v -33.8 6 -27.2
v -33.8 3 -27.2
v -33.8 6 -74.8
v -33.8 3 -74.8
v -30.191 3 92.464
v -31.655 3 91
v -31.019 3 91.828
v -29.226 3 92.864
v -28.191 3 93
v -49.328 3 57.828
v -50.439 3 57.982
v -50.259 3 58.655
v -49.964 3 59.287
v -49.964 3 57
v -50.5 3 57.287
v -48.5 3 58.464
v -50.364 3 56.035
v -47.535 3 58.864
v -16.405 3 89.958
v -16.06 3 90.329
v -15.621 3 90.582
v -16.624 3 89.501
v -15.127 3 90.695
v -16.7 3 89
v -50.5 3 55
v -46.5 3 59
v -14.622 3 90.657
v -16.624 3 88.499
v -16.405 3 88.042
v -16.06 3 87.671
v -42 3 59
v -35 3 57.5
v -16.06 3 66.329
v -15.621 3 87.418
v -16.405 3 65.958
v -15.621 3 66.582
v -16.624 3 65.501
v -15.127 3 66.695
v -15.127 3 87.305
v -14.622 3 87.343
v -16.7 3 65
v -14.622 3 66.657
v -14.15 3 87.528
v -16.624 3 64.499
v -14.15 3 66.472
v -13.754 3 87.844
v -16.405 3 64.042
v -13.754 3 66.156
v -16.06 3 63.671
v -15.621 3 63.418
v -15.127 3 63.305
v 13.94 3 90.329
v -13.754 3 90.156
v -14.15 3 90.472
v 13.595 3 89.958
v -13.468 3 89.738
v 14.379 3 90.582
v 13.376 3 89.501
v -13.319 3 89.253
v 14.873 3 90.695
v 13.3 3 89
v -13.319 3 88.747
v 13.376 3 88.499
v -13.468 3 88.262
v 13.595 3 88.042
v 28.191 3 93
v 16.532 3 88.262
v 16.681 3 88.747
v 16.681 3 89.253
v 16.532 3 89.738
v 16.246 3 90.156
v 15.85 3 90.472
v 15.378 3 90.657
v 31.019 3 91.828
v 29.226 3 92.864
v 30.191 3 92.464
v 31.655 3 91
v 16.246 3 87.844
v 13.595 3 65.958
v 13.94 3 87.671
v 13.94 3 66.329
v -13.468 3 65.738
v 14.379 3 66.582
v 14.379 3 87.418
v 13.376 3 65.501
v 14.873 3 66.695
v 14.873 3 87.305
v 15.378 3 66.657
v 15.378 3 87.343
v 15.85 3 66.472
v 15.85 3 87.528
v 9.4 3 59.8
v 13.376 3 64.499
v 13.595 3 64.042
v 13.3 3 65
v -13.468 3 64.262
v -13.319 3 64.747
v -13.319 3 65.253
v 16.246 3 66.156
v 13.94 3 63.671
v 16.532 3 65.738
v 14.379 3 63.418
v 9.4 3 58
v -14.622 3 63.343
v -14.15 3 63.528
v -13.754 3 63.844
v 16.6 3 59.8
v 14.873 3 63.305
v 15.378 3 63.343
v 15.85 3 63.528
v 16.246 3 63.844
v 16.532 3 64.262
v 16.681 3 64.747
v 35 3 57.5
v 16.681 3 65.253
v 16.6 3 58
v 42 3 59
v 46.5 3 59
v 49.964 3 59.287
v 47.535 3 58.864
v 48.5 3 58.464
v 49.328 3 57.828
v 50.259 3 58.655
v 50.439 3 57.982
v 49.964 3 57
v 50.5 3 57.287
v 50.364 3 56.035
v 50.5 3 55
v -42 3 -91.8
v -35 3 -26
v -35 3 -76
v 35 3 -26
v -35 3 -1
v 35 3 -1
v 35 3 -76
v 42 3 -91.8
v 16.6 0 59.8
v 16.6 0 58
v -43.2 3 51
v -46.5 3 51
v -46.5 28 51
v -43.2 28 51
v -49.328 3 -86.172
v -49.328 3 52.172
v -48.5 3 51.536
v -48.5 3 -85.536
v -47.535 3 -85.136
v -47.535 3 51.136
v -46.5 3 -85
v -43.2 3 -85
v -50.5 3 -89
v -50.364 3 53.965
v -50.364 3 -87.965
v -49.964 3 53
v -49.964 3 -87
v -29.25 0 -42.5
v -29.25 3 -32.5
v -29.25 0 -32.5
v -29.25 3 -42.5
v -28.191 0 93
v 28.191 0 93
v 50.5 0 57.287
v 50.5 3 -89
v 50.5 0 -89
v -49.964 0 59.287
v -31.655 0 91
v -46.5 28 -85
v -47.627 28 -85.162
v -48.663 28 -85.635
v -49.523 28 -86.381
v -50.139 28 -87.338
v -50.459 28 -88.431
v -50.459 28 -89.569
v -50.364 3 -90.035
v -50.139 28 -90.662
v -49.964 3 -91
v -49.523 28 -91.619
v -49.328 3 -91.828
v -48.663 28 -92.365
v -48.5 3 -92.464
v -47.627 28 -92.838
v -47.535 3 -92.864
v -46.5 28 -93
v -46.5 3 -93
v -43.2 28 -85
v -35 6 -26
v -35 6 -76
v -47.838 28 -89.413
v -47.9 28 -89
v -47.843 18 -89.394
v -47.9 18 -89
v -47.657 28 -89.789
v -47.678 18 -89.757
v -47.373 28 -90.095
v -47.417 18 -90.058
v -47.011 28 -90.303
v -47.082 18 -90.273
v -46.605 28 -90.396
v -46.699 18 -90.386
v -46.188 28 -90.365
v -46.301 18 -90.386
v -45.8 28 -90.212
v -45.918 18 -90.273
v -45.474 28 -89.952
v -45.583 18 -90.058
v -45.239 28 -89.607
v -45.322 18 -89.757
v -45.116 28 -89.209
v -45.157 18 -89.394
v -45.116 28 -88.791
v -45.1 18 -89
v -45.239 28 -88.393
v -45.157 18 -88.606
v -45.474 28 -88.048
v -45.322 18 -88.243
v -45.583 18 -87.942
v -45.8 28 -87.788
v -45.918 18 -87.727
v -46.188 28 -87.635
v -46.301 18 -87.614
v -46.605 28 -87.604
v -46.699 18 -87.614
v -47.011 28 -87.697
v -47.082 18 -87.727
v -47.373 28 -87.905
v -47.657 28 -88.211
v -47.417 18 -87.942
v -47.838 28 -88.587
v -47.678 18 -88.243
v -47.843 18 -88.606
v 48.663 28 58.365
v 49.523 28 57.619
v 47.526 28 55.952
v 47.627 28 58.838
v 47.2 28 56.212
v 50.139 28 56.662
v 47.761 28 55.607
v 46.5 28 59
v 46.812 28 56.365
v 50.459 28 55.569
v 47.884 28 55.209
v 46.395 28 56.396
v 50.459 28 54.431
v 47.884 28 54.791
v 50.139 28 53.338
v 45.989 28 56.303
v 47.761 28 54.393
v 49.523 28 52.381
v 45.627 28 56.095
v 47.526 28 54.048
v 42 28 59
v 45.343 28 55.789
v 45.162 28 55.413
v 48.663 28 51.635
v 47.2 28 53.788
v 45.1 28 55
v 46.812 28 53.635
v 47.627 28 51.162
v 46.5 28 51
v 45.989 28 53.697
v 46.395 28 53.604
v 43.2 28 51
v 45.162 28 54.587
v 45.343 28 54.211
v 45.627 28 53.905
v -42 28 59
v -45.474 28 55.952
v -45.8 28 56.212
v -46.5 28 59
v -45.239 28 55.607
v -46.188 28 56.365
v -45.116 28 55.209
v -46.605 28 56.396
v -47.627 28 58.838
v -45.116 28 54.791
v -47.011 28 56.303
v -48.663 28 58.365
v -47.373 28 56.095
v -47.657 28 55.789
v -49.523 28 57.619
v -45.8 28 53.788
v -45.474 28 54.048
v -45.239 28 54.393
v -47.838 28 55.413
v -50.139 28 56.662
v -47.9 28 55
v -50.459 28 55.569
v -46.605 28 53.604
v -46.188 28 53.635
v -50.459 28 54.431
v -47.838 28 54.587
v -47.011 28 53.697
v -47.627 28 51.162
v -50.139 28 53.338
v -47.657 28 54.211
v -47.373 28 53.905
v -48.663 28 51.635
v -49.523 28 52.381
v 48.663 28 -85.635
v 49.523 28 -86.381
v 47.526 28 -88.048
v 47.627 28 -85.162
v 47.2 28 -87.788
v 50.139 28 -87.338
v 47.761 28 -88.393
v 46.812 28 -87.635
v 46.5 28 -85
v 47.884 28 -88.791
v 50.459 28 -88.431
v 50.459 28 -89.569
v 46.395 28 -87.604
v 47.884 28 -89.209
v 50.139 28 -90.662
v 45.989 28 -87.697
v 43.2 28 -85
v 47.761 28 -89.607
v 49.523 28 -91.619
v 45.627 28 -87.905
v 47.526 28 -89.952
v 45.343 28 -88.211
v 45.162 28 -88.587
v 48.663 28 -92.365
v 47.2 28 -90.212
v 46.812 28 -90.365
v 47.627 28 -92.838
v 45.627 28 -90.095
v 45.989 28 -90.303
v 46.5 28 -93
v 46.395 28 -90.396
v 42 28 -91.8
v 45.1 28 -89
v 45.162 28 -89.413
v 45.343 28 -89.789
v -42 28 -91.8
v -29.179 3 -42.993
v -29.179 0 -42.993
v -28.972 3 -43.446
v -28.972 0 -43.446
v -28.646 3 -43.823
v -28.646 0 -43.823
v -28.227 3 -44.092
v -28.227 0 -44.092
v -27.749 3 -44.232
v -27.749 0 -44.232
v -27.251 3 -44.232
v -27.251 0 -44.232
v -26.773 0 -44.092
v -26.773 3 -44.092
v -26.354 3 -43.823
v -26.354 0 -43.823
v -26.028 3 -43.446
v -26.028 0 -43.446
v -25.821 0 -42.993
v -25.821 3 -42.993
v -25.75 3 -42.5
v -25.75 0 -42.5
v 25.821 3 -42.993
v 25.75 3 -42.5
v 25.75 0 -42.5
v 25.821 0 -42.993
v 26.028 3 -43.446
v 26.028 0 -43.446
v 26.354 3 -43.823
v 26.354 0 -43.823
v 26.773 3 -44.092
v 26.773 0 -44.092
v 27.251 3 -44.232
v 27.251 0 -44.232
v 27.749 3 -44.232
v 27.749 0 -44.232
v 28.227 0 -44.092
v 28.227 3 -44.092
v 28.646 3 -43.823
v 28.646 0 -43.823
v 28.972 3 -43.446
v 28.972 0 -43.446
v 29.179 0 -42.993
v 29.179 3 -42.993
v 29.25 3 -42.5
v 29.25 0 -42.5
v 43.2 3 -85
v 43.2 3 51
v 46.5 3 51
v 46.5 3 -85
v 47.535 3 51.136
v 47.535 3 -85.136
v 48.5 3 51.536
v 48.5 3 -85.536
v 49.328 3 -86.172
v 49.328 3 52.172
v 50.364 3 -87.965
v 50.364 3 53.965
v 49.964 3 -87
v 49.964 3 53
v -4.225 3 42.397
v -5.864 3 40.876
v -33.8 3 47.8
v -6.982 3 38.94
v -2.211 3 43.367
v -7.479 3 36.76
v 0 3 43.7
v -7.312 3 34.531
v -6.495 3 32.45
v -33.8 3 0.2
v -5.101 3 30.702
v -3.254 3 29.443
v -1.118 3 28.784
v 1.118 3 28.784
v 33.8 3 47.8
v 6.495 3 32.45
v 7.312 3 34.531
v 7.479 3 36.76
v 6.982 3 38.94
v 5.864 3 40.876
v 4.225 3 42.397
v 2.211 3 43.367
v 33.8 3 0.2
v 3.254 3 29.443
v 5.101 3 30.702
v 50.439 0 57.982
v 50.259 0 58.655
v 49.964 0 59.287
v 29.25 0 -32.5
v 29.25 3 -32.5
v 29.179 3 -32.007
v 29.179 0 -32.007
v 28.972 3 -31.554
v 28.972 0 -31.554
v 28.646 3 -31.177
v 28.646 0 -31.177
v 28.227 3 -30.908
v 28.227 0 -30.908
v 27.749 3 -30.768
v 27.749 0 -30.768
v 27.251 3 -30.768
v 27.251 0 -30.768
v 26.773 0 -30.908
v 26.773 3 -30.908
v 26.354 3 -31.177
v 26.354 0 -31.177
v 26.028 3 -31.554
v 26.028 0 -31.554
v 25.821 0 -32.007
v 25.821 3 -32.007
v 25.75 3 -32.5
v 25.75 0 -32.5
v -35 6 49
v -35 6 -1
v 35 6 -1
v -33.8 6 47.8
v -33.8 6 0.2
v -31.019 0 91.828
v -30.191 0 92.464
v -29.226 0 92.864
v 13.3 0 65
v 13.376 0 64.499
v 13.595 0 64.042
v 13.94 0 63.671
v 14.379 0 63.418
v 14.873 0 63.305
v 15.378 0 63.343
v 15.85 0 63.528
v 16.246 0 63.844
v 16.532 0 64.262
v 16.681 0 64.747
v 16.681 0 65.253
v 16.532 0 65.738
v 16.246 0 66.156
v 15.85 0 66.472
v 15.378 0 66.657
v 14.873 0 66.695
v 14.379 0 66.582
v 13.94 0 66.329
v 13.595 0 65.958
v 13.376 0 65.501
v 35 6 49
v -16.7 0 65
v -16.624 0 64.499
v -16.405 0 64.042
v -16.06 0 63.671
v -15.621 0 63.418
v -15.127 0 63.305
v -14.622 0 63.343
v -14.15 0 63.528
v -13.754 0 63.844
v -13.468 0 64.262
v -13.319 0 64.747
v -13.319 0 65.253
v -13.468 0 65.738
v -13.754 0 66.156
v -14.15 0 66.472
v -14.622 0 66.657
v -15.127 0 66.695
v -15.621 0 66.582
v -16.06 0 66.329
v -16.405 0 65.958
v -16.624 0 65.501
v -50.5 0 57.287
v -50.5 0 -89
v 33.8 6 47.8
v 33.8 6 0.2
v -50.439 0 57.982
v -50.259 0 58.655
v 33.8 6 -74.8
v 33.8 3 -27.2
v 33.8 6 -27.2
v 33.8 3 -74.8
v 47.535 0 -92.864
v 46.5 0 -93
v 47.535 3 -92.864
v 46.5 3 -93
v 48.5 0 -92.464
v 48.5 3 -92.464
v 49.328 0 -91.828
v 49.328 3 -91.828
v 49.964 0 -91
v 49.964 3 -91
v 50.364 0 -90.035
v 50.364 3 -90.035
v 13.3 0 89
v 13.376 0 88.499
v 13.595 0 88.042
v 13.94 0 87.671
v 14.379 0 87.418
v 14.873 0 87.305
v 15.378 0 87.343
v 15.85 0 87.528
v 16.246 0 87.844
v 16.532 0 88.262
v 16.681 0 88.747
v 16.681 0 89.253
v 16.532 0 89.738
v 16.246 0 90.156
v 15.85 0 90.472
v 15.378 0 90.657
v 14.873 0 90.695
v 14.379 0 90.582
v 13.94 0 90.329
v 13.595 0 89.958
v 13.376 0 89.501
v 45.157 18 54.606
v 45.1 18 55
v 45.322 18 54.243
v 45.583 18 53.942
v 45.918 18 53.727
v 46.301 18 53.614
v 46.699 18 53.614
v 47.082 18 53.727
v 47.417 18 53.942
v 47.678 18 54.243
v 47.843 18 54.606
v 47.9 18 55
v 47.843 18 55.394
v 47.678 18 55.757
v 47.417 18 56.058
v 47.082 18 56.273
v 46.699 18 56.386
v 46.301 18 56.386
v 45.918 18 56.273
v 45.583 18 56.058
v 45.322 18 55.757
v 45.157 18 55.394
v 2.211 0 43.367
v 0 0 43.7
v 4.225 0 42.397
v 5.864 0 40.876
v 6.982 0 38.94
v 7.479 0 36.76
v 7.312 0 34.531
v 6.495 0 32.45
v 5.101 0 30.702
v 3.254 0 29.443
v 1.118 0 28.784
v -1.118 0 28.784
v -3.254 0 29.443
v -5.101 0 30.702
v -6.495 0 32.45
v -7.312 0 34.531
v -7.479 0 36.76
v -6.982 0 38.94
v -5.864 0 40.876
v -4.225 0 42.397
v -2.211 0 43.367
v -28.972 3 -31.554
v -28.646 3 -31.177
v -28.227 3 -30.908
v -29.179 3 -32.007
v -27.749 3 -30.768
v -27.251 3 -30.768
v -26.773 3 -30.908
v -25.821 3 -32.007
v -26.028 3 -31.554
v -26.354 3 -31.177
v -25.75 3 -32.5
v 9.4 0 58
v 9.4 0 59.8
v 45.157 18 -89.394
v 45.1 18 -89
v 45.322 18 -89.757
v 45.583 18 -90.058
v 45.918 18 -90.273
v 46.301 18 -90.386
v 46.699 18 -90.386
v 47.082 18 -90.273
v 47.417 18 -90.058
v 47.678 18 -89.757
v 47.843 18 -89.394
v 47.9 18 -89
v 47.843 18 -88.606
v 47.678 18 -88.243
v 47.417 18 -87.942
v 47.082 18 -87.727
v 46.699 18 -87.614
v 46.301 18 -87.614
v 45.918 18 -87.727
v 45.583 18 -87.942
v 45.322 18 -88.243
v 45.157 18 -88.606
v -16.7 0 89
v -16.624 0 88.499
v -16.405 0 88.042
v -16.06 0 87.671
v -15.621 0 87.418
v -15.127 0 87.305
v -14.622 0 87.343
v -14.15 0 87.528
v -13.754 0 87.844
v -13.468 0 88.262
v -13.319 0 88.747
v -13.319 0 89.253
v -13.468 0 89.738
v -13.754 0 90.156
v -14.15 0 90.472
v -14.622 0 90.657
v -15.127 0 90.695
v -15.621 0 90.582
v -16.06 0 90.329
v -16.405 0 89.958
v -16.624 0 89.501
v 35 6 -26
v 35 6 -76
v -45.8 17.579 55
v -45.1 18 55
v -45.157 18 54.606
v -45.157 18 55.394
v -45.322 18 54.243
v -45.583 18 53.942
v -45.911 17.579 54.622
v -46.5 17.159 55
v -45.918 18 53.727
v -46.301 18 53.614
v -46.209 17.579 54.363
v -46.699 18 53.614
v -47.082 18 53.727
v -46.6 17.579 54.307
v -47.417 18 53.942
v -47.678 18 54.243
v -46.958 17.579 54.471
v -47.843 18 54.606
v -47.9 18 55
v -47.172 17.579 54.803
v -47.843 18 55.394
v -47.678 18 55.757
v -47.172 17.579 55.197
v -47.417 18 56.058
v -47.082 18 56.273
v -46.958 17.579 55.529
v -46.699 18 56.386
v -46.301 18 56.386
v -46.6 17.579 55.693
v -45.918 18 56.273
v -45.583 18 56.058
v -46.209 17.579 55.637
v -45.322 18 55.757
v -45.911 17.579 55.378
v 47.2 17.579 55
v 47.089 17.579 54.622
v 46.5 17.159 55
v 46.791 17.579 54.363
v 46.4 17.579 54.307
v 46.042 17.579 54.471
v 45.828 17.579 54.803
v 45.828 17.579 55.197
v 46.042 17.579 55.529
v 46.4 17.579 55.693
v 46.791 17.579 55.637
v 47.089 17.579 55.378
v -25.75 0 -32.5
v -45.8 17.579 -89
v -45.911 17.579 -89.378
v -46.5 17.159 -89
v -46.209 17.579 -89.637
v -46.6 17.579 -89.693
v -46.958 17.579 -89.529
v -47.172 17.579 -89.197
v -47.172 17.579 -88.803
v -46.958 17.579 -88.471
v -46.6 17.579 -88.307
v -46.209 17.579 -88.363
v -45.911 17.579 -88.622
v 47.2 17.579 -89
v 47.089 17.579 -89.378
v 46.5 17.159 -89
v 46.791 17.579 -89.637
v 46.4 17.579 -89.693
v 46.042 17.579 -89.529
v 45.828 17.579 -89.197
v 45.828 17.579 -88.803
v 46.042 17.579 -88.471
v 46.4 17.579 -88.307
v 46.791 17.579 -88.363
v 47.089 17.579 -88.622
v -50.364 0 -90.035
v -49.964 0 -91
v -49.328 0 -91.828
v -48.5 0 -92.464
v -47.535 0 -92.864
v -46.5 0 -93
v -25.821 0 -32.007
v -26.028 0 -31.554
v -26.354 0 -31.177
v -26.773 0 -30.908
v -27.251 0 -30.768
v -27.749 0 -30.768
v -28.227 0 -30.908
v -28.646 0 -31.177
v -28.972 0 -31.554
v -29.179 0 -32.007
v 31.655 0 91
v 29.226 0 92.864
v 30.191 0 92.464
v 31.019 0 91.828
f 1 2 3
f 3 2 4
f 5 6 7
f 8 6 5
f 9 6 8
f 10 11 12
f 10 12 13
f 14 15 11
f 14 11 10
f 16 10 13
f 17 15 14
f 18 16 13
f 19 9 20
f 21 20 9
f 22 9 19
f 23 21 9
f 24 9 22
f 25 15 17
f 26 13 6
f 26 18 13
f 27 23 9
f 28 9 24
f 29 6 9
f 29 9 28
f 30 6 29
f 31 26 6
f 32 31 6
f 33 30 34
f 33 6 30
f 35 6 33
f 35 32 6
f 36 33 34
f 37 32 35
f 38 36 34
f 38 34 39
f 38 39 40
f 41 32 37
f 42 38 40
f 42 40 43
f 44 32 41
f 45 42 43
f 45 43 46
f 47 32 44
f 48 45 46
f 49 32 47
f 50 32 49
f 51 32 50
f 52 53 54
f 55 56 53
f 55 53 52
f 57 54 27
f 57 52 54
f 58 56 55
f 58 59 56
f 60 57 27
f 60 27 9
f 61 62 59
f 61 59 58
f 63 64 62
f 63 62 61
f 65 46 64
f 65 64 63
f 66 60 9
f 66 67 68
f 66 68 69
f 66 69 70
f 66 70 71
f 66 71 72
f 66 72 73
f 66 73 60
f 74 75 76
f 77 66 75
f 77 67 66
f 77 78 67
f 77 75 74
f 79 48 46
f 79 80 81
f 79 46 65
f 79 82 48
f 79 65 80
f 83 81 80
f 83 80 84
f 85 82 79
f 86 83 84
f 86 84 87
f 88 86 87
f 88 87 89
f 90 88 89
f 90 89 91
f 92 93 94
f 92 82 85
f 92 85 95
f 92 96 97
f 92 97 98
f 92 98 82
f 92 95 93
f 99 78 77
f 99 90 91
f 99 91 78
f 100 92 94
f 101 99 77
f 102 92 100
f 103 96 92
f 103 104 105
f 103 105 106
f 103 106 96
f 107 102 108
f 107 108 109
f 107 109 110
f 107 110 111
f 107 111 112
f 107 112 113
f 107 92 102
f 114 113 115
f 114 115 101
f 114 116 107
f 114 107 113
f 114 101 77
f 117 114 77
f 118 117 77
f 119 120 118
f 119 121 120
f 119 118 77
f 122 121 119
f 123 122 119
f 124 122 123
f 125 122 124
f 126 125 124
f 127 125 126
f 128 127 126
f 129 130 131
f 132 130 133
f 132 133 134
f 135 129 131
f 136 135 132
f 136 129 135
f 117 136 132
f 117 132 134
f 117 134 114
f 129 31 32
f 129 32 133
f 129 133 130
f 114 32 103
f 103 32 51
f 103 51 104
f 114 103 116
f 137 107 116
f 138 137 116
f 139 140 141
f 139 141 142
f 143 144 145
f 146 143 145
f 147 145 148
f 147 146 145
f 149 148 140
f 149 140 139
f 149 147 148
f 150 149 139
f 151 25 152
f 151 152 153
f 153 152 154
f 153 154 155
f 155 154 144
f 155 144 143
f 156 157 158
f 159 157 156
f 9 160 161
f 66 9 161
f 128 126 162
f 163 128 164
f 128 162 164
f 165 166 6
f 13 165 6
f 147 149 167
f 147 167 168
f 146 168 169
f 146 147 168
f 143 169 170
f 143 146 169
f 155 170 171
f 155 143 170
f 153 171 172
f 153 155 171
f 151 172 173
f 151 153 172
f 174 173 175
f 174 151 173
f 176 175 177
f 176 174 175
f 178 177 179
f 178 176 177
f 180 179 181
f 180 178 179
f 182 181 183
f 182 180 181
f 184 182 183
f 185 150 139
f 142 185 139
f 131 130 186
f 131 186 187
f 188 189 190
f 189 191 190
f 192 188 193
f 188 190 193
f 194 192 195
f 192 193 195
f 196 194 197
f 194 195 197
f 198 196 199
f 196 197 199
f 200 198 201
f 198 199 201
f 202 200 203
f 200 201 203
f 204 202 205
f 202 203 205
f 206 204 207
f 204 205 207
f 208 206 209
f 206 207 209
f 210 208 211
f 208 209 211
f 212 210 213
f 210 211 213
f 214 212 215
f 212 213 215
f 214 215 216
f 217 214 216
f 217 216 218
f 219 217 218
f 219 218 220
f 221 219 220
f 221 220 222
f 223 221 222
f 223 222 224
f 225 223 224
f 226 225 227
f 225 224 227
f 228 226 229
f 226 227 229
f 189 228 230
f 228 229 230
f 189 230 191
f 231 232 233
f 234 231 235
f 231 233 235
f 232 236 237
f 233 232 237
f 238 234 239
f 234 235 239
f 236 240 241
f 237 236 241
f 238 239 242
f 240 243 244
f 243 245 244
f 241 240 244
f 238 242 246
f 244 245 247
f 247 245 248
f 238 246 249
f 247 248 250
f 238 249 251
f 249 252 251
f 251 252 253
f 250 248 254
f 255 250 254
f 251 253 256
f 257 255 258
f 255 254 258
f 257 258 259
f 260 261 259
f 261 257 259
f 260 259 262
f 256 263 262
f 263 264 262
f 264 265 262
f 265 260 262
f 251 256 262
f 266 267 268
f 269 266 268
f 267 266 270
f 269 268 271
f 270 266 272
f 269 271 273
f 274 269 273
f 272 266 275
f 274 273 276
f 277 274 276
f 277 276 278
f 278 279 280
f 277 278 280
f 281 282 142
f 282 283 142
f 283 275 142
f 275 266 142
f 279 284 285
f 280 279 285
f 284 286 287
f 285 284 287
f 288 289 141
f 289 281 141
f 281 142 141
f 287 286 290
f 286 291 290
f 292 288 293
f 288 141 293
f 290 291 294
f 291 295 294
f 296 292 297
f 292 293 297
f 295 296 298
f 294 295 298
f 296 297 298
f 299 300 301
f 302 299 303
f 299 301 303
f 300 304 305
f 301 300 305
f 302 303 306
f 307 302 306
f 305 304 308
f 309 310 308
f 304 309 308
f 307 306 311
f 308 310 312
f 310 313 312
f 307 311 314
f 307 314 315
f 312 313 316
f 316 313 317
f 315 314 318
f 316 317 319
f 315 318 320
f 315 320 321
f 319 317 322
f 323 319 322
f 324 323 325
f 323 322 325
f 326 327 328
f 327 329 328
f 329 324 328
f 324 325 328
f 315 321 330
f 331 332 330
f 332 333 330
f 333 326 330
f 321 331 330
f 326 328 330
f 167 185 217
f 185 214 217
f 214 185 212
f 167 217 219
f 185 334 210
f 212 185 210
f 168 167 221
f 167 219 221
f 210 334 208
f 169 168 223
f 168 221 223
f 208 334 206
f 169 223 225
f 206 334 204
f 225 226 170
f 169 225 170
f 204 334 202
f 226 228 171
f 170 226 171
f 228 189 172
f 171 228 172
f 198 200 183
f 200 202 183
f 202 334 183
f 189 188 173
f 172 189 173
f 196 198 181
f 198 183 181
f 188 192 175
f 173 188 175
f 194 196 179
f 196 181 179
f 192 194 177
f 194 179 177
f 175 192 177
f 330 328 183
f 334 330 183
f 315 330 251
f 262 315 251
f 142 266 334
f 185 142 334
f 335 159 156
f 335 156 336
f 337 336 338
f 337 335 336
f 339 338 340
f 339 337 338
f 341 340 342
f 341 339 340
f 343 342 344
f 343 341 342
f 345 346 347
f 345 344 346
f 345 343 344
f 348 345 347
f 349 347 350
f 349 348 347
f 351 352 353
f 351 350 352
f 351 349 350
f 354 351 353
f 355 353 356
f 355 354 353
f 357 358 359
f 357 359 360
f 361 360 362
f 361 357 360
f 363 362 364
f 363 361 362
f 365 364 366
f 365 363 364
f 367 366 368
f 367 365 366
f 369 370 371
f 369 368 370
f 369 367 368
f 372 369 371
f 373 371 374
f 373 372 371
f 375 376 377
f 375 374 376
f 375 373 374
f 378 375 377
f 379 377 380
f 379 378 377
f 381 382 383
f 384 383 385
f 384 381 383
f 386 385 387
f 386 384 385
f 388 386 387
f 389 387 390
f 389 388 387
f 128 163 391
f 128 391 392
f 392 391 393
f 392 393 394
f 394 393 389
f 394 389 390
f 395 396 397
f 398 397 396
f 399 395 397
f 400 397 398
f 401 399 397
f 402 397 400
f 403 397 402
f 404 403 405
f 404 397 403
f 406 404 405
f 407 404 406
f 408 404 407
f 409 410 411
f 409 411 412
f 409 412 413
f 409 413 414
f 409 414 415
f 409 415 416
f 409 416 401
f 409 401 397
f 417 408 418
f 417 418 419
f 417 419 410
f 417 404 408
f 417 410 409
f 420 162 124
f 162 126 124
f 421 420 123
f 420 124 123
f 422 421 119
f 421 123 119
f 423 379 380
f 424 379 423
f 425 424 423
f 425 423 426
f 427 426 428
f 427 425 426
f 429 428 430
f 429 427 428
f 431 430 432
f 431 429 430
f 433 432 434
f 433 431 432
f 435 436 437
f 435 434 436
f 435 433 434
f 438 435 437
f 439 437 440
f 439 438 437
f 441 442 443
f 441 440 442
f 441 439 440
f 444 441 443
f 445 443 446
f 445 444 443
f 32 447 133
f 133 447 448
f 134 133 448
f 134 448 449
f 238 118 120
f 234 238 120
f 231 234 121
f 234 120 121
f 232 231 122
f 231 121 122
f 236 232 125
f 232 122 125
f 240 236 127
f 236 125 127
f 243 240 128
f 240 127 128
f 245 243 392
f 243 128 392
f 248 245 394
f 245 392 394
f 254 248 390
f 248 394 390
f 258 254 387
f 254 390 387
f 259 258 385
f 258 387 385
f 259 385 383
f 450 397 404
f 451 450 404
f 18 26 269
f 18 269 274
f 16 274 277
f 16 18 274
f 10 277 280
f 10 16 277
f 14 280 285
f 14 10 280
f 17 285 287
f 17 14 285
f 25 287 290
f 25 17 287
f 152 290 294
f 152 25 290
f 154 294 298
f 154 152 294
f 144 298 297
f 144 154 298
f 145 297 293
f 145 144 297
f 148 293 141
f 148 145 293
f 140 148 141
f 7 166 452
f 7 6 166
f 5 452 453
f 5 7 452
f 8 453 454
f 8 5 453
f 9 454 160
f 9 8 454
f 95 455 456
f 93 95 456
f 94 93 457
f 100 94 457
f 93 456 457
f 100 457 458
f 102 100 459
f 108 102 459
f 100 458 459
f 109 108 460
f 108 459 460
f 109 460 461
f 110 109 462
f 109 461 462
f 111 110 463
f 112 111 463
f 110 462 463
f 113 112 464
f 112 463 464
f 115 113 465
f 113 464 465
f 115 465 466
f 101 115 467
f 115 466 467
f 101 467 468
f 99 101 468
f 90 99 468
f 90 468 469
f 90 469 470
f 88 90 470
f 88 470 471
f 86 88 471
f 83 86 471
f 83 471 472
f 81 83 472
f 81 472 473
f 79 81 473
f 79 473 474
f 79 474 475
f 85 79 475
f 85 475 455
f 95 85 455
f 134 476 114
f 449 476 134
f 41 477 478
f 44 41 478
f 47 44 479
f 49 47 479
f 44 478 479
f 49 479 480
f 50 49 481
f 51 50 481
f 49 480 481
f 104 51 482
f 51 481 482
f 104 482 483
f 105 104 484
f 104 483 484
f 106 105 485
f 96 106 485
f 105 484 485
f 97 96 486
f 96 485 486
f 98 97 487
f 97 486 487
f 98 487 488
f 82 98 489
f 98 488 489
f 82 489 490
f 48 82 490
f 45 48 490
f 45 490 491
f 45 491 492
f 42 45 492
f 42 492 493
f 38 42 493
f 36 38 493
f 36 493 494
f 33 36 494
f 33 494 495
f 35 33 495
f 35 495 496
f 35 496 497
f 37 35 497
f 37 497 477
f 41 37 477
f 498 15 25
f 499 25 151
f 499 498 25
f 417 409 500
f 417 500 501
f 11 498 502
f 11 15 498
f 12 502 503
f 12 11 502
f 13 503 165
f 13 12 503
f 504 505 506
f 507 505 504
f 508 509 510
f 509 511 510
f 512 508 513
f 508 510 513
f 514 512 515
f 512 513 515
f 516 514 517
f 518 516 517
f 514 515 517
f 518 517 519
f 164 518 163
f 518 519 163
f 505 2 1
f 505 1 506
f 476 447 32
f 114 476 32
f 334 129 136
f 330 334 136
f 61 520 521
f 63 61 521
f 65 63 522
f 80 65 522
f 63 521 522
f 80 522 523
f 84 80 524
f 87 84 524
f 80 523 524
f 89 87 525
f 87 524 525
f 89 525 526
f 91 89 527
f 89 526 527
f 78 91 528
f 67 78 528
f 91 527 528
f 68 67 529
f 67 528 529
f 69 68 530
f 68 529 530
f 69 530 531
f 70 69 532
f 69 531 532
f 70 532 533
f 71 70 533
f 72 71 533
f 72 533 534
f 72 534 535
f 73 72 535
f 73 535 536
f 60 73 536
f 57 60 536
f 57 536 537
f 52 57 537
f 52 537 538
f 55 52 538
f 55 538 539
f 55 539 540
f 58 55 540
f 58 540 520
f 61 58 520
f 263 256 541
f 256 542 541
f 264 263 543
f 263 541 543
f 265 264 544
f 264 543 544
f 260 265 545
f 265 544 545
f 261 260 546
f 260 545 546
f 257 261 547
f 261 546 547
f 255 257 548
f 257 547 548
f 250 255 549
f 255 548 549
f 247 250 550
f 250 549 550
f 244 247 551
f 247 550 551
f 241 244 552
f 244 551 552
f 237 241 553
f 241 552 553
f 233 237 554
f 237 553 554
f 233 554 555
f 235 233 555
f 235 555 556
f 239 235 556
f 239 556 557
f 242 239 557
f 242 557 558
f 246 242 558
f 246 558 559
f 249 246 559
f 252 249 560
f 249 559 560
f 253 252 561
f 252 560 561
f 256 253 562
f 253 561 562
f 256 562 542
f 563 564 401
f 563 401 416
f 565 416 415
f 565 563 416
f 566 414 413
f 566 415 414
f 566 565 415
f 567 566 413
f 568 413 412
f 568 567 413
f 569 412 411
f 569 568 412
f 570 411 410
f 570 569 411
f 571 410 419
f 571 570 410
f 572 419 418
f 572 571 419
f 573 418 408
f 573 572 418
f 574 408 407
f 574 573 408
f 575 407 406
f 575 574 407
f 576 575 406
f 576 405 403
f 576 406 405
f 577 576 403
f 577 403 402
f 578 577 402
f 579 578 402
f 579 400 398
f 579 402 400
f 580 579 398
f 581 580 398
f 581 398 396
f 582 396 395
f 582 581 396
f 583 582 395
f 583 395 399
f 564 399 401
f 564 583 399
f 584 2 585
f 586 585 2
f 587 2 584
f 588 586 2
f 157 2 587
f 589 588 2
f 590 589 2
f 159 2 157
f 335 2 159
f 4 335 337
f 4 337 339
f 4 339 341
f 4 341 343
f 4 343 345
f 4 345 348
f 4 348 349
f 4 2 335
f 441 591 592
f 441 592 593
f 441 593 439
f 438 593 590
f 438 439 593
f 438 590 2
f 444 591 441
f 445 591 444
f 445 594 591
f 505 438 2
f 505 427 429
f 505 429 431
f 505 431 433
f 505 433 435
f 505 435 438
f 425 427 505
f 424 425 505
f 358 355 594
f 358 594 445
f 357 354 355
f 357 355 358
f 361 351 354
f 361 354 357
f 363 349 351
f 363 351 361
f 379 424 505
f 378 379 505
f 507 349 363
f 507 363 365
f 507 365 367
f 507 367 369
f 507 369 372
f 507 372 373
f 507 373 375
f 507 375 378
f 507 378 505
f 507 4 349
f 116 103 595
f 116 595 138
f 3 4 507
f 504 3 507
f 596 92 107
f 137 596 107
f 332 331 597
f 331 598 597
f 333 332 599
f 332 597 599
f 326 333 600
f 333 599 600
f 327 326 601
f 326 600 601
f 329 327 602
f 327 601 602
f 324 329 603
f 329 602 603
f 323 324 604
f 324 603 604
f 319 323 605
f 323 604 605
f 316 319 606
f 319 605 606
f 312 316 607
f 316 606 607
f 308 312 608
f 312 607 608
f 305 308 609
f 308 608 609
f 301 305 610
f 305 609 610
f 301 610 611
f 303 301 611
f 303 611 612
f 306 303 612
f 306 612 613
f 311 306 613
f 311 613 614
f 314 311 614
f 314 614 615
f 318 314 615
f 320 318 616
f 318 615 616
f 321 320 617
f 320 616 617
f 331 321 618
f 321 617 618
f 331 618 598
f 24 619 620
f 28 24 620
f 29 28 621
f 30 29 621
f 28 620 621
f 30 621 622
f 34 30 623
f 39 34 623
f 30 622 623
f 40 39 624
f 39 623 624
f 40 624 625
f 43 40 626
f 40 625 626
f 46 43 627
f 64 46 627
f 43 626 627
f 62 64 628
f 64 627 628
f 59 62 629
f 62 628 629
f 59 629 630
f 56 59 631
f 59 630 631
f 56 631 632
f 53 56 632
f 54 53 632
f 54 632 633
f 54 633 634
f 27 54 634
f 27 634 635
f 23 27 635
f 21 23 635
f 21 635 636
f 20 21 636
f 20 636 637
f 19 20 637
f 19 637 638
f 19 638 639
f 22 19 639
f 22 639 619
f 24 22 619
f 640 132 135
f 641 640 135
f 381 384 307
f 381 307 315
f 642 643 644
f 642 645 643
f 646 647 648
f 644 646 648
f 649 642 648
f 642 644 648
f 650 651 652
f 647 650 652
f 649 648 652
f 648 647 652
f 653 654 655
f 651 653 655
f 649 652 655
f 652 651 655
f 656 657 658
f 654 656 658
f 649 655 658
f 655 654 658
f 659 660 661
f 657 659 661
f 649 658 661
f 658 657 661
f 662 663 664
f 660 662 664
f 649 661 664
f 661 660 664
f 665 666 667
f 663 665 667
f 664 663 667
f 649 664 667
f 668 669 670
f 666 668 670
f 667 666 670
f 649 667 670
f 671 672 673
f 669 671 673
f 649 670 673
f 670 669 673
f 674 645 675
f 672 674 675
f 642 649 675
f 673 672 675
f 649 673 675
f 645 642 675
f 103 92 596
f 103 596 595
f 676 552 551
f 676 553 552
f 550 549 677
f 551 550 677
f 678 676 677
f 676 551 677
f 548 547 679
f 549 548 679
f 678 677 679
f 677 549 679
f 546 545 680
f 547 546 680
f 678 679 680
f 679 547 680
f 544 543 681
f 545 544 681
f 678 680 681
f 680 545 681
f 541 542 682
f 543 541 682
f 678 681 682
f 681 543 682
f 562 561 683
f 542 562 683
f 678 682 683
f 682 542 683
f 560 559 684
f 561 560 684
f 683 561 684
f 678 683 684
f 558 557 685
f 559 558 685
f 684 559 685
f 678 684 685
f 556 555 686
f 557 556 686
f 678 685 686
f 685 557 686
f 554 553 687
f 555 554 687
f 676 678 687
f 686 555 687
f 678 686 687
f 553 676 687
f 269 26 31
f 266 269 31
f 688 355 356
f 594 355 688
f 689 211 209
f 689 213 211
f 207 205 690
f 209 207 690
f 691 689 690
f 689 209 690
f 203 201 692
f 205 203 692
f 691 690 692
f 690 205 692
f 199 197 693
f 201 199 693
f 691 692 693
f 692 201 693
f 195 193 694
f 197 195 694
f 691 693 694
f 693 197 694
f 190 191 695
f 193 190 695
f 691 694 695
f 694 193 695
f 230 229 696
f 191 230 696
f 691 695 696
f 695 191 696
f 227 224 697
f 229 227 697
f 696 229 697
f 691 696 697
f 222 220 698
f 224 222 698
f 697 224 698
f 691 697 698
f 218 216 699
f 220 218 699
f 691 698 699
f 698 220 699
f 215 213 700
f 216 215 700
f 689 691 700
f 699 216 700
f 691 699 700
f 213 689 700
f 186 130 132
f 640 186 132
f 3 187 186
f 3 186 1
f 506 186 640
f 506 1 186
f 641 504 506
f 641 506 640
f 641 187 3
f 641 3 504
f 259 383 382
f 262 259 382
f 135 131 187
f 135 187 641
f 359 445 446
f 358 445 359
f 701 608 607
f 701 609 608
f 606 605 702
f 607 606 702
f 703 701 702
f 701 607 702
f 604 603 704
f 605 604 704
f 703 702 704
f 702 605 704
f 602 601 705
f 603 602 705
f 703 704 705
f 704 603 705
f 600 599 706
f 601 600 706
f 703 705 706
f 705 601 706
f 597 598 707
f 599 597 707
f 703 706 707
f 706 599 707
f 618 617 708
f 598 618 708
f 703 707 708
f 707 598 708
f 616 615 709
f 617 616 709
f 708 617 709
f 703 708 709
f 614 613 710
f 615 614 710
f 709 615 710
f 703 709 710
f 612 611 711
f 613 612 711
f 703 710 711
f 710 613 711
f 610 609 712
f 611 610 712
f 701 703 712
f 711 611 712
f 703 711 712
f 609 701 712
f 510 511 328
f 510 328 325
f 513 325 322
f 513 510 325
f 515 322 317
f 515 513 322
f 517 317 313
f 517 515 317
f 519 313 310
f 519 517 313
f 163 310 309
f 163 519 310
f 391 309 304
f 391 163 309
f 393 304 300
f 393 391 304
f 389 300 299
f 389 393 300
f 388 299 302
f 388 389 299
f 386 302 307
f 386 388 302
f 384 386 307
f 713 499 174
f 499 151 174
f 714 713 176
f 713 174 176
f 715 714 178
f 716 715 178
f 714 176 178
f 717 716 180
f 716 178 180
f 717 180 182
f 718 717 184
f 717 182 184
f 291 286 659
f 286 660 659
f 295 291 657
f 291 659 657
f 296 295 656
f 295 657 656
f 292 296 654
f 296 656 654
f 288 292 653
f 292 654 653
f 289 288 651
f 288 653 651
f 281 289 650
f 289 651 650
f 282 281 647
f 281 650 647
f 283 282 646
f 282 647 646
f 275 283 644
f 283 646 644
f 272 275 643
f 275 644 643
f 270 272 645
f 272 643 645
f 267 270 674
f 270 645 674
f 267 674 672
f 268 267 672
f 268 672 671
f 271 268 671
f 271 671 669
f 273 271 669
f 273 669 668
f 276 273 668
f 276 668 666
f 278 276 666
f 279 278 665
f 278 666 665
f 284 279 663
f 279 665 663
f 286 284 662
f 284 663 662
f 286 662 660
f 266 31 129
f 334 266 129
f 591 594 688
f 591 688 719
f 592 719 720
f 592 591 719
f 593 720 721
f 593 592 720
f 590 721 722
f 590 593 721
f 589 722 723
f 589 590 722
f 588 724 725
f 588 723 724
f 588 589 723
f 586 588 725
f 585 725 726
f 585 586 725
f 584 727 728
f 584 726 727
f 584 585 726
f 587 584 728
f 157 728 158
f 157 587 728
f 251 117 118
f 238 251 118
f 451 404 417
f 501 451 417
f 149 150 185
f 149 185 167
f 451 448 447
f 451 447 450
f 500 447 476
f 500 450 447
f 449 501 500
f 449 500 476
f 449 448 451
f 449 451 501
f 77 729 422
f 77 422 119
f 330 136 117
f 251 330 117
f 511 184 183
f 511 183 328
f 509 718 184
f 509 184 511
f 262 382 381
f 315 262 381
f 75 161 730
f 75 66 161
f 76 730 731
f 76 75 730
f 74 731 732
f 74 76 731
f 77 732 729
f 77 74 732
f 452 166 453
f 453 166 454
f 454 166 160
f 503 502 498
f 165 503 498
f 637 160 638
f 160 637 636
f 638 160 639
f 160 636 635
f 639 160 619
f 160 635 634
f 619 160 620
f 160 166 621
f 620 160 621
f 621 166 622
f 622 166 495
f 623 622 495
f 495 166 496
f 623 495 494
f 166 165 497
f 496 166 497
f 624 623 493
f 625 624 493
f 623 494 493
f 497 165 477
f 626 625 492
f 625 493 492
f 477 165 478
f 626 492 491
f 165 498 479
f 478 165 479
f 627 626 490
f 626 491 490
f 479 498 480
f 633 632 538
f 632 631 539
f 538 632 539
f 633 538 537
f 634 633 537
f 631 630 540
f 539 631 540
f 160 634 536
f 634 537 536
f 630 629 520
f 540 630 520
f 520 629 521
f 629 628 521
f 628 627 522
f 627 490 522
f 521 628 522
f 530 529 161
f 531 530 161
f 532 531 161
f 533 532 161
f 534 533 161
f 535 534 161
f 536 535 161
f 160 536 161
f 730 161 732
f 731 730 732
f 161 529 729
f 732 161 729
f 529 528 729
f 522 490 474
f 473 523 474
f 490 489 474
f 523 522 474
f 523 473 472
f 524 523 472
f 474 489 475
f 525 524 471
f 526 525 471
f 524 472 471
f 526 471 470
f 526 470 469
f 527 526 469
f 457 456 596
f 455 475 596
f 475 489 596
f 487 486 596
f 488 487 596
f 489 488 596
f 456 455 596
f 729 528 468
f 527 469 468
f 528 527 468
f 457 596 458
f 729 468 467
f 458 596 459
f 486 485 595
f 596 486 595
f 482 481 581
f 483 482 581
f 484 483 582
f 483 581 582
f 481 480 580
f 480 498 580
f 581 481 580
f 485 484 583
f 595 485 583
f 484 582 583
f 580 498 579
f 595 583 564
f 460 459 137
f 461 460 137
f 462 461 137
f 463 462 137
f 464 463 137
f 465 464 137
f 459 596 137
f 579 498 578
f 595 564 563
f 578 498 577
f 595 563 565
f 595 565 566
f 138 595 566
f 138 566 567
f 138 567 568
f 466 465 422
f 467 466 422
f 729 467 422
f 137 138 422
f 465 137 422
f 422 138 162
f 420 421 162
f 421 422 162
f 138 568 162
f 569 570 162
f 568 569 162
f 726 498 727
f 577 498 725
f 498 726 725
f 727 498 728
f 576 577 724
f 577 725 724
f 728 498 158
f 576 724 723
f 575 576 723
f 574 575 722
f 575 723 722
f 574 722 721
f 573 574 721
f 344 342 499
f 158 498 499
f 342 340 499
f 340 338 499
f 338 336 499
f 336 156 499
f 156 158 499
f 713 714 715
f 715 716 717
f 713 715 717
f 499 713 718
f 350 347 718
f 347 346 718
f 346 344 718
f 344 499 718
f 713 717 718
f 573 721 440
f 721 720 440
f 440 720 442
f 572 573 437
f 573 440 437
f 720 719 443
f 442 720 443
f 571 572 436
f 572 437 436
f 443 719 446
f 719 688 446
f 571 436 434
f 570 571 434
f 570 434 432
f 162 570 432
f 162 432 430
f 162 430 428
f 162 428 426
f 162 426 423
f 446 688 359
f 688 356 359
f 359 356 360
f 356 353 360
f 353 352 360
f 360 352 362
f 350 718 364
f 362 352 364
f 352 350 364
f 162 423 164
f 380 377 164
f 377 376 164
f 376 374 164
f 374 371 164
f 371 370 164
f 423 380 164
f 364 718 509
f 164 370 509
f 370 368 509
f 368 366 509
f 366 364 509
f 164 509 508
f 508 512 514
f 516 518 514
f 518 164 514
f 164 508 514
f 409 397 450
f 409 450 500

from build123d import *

# Parameters (mm, degrees)
SCHIZZO1_W                    = 101
SCHIZZO1_H                    = 186
ESTRUSIONE_ESTRUSIONE1_DEPTH  = 3
ESTRUSIONE_ESTRUSIONE3_DEPTH  = 25
SCHIZZO2_W                    = 70
SCHIZZO2_H                    = 50
SCHIZZO2_W_2                  = 67.6
SCHIZZO2_H_2                  = 47.6
ESTRUSIONE_ESTRUSIONE2_DEPTH  = 3
ESTRUSIONE_ESTRUSIONE5_DEPTH  = 70
TAGLIO_ESTRUSIONE2_DEPTH      = 109.739367296
TAGLIO_ESTRUSIONE2_DEPTH_BACK = 109.739367296
SCHIZZO9_R                    = 7.5
SCHIZZO4_W                    = 7.2
SCHIZZO4_H                    = 1.8
TAGLIO_ESTRUSIONE1_DEPTH      = 109.739367296
ESTRUSIONE_ESTRUSIONE4_DEPTH  = 25
FORO_2_8_2_8_1_D              = 2.8
FORO_2_8_2_8_1_DEPTH          = 10
FORO_2_8_2_8_1_TIP            = 0.841204867
SMUSSO1_SIZE                  = 20
SMUSSO1_SIZE2                 = 34.641016151
RACCORDO1_R                   = 4
TAGLIO_ESTRUSIONE3_DEPTH      = 109.739367296
FORO_PER_VITE_M3_1_D          = 3.4
FORO_PER_VITE_M3_1_DEPTH      = 10
FORO_PER_VITE_M3_1_TIP        = 1.021463052


with BuildPart() as part:
    # Schizzo1 → Estrusione-Estrusione1 (new body)
    with BuildSketch(Plane(origin=(0, 0, 0), x_dir=(1, 0, 0), z_dir=(0, 1, 0))):
        Rectangle(SCHIZZO1_W, SCHIZZO1_H)
    extrude(amount=ESTRUSIONE_ESTRUSIONE1_DEPTH)

    # Schizzo3 → Estrusione-Estrusione3 (add)
    with BuildSketch(Plane(origin=(0, 3, 0), x_dir=(1, 0, 0), z_dir=(0, 1, 0))):
        Polygon((-43.2, -59), (-42, -59), (-42, 91.8), (42, 91.8), (42, -59), (43.2, -59), (43.2, 93), (-43.2, 93), align=None)
    extrude(amount=ESTRUSIONE_ESTRUSIONE3_DEPTH)

    # Schizzo2 → Estrusione-Estrusione2 (add)
    # profile 1 of 2: a face of its own
    with BuildSketch(Plane(origin=(0, 3, 0), x_dir=(1, 0, 0), z_dir=(0, 1, 0))):
        with Locations((0, 51)):
            Rectangle(SCHIZZO2_W, SCHIZZO2_H)
        with Locations((0, 51)):
            Rectangle(SCHIZZO2_W_2, SCHIZZO2_H_2, mode=Mode.SUBTRACT)
    # profile 2 of 2: a face of its own
    with BuildSketch(Plane(origin=(0, 3, 0), x_dir=(1, 0, 0), z_dir=(0, 1, 0))):
        with Locations((0, -24)):
            Rectangle(SCHIZZO2_W, SCHIZZO2_H)
        with Locations((0, -24)):
            Rectangle(SCHIZZO2_W_2, SCHIZZO2_H_2, mode=Mode.SUBTRACT)
    extrude(amount=ESTRUSIONE_ESTRUSIONE2_DEPTH)

    # Schizzo13 → Estrusione-Estrusione5 (add)
    with BuildSketch(Plane.ZY.offset(35)):
        Polygon((49, 6), (57.5, 3), (49, 3), align=None)
    extrude(amount=-ESTRUSIONE_ESTRUSIONE5_DEPTH)

    # Schizzo9 → Taglio-Estrusione2 (cut, two sides: drawn at the far end of the back side and taken through both)
    with BuildSketch(Plane(origin=(0, 3, 0), x_dir=(1, 0, 0), z_dir=(0, 1, 0)).offset(-TAGLIO_ESTRUSIONE2_DEPTH_BACK)):
        with Locations(Location((0, -36.2, 0), (0, 0, 270))):
            Circle(SCHIZZO9_R)
    extrude(amount=TAGLIO_ESTRUSIONE2_DEPTH + TAGLIO_ESTRUSIONE2_DEPTH_BACK, mode=Mode.SUBTRACT)

    # Schizzo4 → Taglio-Estrusione1 (cut, through all)
    with BuildSketch(Plane(origin=(0, 3, 0), x_dir=(1, 0, 0), z_dir=(0, 1, 0))):
        with Locations((13, -58.9)):
            Rectangle(SCHIZZO4_W, SCHIZZO4_H)
    extrude(amount=-TAGLIO_ESTRUSIONE1_DEPTH, mode=Mode.SUBTRACT)

    # Schizzo5 → Estrusione-Estrusione4 (add)
    with BuildSketch(Plane(origin=(0, 3, 0), x_dir=(1, 0, 0), z_dir=(0, 1, 0))):
        with BuildLine():
            Line((-43.2, 93), (-43.2, 85))
            Line((-43.2, 85), (-46.5, 85))
            ThreePointArc((-46.5, 85), (-50.5, 89), (-46.5, 93))
            Line((-46.5, 93), (-43.2, 93))
        make_face()
        with BuildLine():
            Line((46.5, 85), (43.2, 85))
            Line((43.2, 85), (43.2, 93))
            Line((43.2, 93), (46.5, 93))
            ThreePointArc((46.5, 93), (50.5, 89), (46.5, 85))
        make_face()
        with BuildLine():
            Line((46.5, -51), (43.2, -51))
            Line((43.2, -51), (43.2, -59))
            Line((43.2, -59), (46.5, -59))
            ThreePointArc((46.5, -59), (50.5, -55), (46.5, -51))
        make_face()
        with BuildLine():
            Line((-46.5, -51), (-43.2, -51))
            Line((-43.2, -51), (-43.2, -59))
            Line((-43.2, -59), (-46.5, -59))
            ThreePointArc((-46.5, -59), (-50.5, -55), (-46.5, -51))
        make_face()
    extrude(amount=ESTRUSIONE_ESTRUSIONE4_DEPTH)

    # Foro Ø2.8 (2.8)-1
    with Locations(Plane(origin=(0, 28, 0), x_dir=(1, 0, 0), z_dir=(0, 1, 0))):
        with Locations((-46.5, 89), (46.5, 89), (46.5, -55), (-46.5, -55)):
            Hole(FORO_2_8_2_8_1_D / 2, depth=FORO_2_8_2_8_1_DEPTH)
            with Locations((0, 0, -(FORO_2_8_2_8_1_DEPTH + FORO_2_8_2_8_1_TIP / 2))):  # 118° drill point
                Cone(0, FORO_2_8_2_8_1_D / 2, FORO_2_8_2_8_1_TIP, mode=Mode.SUBTRACT)

    # Smusso1
    smusso1_edges = [part.edges().sort_by_distance(p)[0] for p in [
        (50.5, 1.5, 93),
        (-50.5, 1.5, 93),
    ]]
    smusso1_side = [part.faces().sort_by_distance(p)[0] for p in [
        (0, 1.5, 93),
    ]]
    chamfer(smusso1_edges, length=SMUSSO1_SIZE, length2=SMUSSO1_SIZE2, reference=smusso1_side[0])

    # Raccordo1
    raccordo1_edges = [part.edges().sort_by_distance(p)[0] for p in [
        (50.5, 1.5, 58.358983849),
        (-50.5, 1.5, 58.358983849),
        (30.5, 1.5, 93),
        (-30.5, 1.5, 93),
        (-50.5, 1.5, -93),
        (50.5, 1.5, -93),
    ]]
    fillet(raccordo1_edges, radius=RACCORDO1_R - 0.0001)  # a hair under: the kernel refuses the full size

    # Schizzo10 → Taglio-Estrusione3 (cut, through all)
    with BuildSketch(Plane(origin=(0, 3, 0), x_dir=(1, 0, 0), z_dir=(0, 1, 0))):
        with BuildLine():
            Line((29.25, 42.5), (29.25, 32.5))
            ThreePointArc((29.25, 32.5), (27.5, 30.75), (25.75, 32.5))
            Line((25.75, 32.5), (25.75, 42.5))
            ThreePointArc((25.75, 42.5), (27.5, 44.25), (29.25, 42.5))
        make_face()
        with BuildLine():
            Line((-25.75, 42.5), (-25.75, 32.5))
            ThreePointArc((-25.75, 32.5), (-27.5, 30.75), (-29.25, 32.5))
            Line((-29.25, 32.5), (-29.25, 42.5))
            ThreePointArc((-29.25, 42.5), (-27.5, 44.25), (-25.75, 42.5))
        make_face()
    extrude(amount=-TAGLIO_ESTRUSIONE3_DEPTH, mode=Mode.SUBTRACT)

    # Foro per Vite M3-1
    with Locations(Plane(origin=(0, 3, 0), x_dir=(1, 0, 0), z_dir=(0, 1, 0))):
        with Locations((15, -65), (15, -89), (-15, -89), (-15, -65)):
            Hole(FORO_PER_VITE_M3_1_D / 2, depth=FORO_PER_VITE_M3_1_DEPTH)
            with Locations((0, 0, -(FORO_PER_VITE_M3_1_DEPTH + FORO_PER_VITE_M3_1_TIP / 2))):  # 118° drill point
                Cone(0, FORO_PER_VITE_M3_1_D / 2, FORO_PER_VITE_M3_1_TIP, mode=Mode.SUBTRACT)


solid = part.part
